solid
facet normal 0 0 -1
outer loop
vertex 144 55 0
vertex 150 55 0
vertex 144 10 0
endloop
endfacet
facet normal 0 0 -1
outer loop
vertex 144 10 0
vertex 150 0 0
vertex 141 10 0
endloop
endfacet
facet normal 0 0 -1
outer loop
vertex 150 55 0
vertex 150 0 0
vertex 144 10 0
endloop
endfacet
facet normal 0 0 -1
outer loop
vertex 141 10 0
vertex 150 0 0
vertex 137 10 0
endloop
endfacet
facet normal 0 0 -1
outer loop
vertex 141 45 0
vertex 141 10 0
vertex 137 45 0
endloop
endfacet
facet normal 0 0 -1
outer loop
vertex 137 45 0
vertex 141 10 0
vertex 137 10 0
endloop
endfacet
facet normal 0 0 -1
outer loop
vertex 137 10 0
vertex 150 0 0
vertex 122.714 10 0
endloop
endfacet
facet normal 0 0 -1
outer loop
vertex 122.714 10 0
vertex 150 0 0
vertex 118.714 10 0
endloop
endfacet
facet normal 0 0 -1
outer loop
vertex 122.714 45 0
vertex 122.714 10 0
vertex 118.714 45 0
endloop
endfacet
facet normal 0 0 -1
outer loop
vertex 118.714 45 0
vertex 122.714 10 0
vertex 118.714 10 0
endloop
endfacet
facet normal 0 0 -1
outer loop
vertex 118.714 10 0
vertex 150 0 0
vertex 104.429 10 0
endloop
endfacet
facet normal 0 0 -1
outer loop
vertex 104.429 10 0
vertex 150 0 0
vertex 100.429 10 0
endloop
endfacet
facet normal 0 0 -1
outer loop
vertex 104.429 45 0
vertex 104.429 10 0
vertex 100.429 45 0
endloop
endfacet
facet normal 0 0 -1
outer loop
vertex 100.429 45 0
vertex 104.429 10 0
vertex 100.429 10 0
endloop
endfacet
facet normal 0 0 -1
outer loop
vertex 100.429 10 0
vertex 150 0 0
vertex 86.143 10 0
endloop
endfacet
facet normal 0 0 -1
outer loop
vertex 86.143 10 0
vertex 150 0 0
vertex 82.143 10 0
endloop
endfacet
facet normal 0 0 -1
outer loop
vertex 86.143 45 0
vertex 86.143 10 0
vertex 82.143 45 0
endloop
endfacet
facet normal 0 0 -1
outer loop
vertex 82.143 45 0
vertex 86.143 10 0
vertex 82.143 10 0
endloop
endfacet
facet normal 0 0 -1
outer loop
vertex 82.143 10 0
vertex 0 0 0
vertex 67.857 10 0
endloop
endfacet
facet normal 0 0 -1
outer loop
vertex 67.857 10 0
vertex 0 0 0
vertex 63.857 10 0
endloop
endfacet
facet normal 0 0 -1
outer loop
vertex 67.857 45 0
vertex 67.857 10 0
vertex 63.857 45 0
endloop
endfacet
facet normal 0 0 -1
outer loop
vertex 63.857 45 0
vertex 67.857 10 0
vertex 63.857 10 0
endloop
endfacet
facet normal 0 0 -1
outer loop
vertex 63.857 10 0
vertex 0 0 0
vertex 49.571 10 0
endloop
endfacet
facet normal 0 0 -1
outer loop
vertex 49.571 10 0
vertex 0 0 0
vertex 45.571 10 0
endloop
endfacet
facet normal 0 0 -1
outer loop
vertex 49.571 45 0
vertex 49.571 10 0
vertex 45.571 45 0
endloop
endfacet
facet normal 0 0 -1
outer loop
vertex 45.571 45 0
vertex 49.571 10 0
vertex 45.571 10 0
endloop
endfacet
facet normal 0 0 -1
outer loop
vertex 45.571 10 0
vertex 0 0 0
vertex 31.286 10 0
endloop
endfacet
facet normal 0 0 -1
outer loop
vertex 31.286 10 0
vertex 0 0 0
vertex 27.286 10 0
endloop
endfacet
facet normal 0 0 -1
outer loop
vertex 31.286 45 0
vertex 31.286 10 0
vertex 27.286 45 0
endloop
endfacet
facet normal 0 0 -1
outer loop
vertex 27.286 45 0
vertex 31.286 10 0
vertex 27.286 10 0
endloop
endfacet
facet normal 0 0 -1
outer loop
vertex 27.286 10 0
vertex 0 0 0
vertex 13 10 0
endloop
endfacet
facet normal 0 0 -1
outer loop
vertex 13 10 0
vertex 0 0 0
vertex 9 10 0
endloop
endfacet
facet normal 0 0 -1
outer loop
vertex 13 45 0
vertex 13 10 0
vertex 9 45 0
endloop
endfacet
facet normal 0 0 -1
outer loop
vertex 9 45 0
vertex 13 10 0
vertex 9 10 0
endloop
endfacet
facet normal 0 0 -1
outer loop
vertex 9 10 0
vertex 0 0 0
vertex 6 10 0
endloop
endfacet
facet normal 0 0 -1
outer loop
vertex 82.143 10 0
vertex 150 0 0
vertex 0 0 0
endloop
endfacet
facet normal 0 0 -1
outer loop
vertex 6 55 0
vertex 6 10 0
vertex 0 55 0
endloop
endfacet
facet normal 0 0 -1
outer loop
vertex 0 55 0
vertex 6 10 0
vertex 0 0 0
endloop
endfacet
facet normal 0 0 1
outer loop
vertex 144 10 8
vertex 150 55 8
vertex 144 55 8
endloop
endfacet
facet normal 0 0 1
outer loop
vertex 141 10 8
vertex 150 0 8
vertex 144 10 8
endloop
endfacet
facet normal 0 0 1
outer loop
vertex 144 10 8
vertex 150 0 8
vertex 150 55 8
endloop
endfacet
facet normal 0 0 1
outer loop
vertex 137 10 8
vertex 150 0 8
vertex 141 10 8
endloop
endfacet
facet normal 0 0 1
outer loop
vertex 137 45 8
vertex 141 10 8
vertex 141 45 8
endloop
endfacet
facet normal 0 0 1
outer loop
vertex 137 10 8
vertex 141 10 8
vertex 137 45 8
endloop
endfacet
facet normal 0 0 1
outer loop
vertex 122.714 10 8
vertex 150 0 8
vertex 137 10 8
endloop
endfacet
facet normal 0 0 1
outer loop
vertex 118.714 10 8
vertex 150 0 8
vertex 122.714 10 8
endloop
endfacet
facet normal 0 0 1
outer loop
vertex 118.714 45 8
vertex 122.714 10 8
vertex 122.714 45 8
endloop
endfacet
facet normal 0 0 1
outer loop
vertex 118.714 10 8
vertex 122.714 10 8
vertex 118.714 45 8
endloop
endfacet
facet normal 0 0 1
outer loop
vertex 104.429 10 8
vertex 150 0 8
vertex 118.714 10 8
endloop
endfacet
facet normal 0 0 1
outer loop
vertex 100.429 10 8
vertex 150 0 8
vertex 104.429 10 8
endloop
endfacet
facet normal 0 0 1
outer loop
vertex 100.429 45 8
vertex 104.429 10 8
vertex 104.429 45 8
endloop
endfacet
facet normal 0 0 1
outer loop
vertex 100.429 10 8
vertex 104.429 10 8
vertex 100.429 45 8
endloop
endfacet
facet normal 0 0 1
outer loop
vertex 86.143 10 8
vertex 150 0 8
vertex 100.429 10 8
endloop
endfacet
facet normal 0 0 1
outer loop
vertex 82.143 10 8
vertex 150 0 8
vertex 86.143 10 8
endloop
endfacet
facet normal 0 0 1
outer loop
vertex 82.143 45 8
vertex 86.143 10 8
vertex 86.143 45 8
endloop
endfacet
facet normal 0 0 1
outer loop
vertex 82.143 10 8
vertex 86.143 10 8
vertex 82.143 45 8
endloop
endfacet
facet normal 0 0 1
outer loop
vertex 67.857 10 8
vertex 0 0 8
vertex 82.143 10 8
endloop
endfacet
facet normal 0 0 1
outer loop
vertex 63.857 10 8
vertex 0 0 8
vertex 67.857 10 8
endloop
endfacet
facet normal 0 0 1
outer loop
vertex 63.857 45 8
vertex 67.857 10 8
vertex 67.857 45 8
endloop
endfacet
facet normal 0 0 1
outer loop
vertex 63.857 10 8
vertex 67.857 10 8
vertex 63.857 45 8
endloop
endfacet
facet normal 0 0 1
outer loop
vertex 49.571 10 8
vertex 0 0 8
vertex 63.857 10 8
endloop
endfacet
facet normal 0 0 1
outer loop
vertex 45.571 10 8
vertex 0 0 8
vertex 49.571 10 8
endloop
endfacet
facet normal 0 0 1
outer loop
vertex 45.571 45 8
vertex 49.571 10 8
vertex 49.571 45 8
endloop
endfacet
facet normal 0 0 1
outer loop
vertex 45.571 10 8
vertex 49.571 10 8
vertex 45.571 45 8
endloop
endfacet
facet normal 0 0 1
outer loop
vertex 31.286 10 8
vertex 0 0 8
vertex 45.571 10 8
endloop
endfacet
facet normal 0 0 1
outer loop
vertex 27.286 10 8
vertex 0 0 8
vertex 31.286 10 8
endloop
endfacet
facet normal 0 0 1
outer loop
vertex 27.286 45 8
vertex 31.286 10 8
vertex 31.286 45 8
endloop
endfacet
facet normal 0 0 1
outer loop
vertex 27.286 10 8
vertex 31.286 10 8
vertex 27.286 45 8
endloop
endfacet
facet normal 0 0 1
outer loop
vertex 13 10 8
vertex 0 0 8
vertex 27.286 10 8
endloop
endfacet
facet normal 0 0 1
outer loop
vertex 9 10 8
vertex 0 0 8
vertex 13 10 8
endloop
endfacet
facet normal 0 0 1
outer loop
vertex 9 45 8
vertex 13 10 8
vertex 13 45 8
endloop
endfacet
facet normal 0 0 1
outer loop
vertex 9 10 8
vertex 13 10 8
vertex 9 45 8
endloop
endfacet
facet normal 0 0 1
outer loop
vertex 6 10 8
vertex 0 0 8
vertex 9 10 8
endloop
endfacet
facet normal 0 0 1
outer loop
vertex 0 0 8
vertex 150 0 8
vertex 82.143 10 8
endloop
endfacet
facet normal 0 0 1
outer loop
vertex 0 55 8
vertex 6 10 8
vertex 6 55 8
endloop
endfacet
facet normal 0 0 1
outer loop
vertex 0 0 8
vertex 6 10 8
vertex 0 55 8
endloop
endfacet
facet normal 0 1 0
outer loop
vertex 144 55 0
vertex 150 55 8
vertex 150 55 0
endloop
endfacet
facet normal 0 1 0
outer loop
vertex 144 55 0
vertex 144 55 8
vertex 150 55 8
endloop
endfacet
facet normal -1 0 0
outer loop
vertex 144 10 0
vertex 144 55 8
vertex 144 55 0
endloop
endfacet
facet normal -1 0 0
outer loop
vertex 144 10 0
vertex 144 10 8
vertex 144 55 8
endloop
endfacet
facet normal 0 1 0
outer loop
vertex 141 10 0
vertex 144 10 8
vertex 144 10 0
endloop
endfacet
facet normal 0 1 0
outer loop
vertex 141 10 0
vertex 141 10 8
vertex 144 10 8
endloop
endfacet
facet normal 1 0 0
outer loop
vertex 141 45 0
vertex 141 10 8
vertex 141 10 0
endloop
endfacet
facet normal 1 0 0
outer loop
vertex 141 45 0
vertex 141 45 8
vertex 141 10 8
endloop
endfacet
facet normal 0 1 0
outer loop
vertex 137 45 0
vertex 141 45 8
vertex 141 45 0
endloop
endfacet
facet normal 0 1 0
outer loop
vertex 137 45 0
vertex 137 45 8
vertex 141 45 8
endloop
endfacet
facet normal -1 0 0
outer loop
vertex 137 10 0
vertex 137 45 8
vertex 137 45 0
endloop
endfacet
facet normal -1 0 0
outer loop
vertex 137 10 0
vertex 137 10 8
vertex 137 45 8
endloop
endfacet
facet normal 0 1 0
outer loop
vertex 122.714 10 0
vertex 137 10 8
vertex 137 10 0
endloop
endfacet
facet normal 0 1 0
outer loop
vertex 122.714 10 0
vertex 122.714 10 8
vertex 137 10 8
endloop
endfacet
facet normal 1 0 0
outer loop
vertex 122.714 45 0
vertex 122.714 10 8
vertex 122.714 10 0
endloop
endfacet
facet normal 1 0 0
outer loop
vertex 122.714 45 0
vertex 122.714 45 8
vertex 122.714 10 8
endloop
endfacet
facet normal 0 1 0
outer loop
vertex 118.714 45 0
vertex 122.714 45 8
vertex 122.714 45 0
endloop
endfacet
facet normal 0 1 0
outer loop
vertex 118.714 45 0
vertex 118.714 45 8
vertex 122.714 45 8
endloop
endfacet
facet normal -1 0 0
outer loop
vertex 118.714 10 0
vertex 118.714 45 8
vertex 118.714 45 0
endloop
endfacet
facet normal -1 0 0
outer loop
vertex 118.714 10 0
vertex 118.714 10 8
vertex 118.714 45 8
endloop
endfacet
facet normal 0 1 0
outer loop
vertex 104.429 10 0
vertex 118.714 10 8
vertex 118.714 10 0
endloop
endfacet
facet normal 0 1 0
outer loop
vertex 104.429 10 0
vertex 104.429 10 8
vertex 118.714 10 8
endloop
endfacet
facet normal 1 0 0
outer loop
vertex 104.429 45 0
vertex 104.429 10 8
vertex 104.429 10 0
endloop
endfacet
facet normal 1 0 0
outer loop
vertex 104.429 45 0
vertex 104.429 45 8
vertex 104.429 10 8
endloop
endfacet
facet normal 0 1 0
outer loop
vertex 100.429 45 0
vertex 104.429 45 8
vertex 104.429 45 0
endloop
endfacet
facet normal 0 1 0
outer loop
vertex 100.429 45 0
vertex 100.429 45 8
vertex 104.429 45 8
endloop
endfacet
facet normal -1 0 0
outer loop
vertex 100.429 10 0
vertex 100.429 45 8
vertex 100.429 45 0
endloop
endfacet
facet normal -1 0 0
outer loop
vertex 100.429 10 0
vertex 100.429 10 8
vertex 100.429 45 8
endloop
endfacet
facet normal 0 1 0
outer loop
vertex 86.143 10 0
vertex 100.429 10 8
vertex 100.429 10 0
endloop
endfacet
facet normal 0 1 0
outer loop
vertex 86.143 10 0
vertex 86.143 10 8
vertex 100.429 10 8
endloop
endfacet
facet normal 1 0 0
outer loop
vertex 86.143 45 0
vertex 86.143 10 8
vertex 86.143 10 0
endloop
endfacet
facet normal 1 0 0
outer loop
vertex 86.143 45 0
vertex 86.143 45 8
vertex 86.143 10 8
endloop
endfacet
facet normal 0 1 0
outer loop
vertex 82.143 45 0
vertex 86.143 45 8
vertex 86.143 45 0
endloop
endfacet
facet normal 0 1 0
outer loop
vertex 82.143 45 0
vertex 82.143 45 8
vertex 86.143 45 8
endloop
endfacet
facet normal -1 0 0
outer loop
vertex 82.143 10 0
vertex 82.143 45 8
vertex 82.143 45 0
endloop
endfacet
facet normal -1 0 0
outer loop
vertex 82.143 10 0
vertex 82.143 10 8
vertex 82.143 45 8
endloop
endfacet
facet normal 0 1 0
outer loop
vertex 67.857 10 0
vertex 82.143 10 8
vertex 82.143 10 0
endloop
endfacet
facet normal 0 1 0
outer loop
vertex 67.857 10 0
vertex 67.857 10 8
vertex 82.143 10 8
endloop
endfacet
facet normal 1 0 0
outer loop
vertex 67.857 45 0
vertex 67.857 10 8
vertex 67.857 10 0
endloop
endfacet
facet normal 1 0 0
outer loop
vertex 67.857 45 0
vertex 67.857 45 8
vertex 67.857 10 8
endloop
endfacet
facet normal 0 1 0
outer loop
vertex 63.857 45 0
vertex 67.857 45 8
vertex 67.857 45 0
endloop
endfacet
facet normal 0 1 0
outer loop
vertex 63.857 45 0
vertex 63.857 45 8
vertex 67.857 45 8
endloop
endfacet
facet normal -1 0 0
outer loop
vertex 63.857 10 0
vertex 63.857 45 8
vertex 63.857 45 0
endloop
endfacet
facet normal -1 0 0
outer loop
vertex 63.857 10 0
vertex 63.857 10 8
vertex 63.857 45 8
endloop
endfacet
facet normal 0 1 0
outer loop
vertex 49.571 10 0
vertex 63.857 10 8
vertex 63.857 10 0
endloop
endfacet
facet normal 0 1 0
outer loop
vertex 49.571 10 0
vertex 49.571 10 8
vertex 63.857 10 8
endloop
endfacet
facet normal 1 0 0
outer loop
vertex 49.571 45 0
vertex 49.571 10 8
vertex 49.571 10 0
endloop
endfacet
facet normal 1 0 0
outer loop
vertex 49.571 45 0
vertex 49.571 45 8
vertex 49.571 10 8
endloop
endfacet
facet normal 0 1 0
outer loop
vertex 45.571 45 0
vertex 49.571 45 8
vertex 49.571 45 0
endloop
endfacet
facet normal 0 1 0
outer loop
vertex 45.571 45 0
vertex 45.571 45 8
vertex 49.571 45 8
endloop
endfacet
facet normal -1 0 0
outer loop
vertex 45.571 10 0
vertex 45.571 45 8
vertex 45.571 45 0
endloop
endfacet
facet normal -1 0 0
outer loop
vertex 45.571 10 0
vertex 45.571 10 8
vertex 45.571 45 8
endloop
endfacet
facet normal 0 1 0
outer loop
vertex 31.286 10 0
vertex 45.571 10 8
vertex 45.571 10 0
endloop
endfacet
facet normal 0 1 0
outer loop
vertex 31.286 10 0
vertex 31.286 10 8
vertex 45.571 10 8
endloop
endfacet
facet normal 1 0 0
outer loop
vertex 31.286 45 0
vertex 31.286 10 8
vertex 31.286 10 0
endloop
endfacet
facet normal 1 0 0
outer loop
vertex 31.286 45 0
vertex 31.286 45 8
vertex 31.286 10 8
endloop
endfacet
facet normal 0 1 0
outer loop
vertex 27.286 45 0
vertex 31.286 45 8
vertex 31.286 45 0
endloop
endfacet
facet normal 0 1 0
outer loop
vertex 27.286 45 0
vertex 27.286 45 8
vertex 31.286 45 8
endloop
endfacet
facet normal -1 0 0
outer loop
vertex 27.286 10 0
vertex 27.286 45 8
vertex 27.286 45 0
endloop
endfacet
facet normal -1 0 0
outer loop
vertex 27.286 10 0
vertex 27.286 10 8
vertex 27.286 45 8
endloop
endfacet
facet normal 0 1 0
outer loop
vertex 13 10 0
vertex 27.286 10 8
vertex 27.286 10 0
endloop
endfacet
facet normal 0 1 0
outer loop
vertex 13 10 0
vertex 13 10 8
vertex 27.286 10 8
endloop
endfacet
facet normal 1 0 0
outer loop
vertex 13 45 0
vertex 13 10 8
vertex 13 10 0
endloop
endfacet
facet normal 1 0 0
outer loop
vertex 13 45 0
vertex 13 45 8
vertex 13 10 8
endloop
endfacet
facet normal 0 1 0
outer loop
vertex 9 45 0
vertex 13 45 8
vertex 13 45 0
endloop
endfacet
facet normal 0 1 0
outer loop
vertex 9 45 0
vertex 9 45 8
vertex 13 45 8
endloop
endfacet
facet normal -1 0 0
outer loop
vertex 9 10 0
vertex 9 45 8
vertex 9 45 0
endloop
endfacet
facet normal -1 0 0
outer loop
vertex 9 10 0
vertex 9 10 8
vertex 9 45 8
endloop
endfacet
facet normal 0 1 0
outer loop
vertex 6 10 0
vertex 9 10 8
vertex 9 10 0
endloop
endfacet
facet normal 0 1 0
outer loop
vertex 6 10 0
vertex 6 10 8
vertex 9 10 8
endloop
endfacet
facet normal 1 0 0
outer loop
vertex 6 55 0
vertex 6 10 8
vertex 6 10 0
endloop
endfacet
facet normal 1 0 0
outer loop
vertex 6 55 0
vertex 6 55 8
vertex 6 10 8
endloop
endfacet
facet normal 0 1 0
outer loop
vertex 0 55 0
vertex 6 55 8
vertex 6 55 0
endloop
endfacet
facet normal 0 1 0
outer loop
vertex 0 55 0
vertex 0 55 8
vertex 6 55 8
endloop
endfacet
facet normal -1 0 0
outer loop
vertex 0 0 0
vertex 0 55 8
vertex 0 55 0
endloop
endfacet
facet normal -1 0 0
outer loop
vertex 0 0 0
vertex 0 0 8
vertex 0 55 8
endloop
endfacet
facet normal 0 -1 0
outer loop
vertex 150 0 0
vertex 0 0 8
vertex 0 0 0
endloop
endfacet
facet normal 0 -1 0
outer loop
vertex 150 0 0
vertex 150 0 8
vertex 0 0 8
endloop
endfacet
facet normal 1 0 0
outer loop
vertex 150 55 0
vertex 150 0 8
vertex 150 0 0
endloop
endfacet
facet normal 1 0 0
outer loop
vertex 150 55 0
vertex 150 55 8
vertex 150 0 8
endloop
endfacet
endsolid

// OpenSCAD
$fn = 32;

// ----------------------------------------------------------------------
// Guard grille: 8 slats over a 150 x 55 mm plate
// ----------------------------------------------------------------------

// --- parameters (mm) ---
profile_height = 8;       // extrusion height
profile_points = 40;      // points of the closed outline

profile = [[0, 0], [150, 0], [150, 55], [144, 55], [144, 10], [141, 10], [141, 45], [137, 45], [137, 10], [122.714, 10], [122.714, 45], [118.714, 45], [118.714, 10], [104.429, 10], [104.429, 45], [100.429, 45], [100.429, 10], [86.143, 10], [86.143, 45], [82.143, 45], [82.143, 10], [67.857, 10], [67.857, 45], [63.857, 45], [63.857, 10], [49.571, 10], [49.571, 45], [45.571, 45], [45.571, 10], [31.286, 10], [31.286, 45], [27.286, 45], [27.286, 10], [13, 10], [13, 45], [9, 45], [9, 10], [6, 10], [6, 55], [0, 55]];  // single closed polygon, 40 points, counter clockwise

// --- the one profile operation ---
linear_extrude(height = profile_height) polygon(points = profile);
